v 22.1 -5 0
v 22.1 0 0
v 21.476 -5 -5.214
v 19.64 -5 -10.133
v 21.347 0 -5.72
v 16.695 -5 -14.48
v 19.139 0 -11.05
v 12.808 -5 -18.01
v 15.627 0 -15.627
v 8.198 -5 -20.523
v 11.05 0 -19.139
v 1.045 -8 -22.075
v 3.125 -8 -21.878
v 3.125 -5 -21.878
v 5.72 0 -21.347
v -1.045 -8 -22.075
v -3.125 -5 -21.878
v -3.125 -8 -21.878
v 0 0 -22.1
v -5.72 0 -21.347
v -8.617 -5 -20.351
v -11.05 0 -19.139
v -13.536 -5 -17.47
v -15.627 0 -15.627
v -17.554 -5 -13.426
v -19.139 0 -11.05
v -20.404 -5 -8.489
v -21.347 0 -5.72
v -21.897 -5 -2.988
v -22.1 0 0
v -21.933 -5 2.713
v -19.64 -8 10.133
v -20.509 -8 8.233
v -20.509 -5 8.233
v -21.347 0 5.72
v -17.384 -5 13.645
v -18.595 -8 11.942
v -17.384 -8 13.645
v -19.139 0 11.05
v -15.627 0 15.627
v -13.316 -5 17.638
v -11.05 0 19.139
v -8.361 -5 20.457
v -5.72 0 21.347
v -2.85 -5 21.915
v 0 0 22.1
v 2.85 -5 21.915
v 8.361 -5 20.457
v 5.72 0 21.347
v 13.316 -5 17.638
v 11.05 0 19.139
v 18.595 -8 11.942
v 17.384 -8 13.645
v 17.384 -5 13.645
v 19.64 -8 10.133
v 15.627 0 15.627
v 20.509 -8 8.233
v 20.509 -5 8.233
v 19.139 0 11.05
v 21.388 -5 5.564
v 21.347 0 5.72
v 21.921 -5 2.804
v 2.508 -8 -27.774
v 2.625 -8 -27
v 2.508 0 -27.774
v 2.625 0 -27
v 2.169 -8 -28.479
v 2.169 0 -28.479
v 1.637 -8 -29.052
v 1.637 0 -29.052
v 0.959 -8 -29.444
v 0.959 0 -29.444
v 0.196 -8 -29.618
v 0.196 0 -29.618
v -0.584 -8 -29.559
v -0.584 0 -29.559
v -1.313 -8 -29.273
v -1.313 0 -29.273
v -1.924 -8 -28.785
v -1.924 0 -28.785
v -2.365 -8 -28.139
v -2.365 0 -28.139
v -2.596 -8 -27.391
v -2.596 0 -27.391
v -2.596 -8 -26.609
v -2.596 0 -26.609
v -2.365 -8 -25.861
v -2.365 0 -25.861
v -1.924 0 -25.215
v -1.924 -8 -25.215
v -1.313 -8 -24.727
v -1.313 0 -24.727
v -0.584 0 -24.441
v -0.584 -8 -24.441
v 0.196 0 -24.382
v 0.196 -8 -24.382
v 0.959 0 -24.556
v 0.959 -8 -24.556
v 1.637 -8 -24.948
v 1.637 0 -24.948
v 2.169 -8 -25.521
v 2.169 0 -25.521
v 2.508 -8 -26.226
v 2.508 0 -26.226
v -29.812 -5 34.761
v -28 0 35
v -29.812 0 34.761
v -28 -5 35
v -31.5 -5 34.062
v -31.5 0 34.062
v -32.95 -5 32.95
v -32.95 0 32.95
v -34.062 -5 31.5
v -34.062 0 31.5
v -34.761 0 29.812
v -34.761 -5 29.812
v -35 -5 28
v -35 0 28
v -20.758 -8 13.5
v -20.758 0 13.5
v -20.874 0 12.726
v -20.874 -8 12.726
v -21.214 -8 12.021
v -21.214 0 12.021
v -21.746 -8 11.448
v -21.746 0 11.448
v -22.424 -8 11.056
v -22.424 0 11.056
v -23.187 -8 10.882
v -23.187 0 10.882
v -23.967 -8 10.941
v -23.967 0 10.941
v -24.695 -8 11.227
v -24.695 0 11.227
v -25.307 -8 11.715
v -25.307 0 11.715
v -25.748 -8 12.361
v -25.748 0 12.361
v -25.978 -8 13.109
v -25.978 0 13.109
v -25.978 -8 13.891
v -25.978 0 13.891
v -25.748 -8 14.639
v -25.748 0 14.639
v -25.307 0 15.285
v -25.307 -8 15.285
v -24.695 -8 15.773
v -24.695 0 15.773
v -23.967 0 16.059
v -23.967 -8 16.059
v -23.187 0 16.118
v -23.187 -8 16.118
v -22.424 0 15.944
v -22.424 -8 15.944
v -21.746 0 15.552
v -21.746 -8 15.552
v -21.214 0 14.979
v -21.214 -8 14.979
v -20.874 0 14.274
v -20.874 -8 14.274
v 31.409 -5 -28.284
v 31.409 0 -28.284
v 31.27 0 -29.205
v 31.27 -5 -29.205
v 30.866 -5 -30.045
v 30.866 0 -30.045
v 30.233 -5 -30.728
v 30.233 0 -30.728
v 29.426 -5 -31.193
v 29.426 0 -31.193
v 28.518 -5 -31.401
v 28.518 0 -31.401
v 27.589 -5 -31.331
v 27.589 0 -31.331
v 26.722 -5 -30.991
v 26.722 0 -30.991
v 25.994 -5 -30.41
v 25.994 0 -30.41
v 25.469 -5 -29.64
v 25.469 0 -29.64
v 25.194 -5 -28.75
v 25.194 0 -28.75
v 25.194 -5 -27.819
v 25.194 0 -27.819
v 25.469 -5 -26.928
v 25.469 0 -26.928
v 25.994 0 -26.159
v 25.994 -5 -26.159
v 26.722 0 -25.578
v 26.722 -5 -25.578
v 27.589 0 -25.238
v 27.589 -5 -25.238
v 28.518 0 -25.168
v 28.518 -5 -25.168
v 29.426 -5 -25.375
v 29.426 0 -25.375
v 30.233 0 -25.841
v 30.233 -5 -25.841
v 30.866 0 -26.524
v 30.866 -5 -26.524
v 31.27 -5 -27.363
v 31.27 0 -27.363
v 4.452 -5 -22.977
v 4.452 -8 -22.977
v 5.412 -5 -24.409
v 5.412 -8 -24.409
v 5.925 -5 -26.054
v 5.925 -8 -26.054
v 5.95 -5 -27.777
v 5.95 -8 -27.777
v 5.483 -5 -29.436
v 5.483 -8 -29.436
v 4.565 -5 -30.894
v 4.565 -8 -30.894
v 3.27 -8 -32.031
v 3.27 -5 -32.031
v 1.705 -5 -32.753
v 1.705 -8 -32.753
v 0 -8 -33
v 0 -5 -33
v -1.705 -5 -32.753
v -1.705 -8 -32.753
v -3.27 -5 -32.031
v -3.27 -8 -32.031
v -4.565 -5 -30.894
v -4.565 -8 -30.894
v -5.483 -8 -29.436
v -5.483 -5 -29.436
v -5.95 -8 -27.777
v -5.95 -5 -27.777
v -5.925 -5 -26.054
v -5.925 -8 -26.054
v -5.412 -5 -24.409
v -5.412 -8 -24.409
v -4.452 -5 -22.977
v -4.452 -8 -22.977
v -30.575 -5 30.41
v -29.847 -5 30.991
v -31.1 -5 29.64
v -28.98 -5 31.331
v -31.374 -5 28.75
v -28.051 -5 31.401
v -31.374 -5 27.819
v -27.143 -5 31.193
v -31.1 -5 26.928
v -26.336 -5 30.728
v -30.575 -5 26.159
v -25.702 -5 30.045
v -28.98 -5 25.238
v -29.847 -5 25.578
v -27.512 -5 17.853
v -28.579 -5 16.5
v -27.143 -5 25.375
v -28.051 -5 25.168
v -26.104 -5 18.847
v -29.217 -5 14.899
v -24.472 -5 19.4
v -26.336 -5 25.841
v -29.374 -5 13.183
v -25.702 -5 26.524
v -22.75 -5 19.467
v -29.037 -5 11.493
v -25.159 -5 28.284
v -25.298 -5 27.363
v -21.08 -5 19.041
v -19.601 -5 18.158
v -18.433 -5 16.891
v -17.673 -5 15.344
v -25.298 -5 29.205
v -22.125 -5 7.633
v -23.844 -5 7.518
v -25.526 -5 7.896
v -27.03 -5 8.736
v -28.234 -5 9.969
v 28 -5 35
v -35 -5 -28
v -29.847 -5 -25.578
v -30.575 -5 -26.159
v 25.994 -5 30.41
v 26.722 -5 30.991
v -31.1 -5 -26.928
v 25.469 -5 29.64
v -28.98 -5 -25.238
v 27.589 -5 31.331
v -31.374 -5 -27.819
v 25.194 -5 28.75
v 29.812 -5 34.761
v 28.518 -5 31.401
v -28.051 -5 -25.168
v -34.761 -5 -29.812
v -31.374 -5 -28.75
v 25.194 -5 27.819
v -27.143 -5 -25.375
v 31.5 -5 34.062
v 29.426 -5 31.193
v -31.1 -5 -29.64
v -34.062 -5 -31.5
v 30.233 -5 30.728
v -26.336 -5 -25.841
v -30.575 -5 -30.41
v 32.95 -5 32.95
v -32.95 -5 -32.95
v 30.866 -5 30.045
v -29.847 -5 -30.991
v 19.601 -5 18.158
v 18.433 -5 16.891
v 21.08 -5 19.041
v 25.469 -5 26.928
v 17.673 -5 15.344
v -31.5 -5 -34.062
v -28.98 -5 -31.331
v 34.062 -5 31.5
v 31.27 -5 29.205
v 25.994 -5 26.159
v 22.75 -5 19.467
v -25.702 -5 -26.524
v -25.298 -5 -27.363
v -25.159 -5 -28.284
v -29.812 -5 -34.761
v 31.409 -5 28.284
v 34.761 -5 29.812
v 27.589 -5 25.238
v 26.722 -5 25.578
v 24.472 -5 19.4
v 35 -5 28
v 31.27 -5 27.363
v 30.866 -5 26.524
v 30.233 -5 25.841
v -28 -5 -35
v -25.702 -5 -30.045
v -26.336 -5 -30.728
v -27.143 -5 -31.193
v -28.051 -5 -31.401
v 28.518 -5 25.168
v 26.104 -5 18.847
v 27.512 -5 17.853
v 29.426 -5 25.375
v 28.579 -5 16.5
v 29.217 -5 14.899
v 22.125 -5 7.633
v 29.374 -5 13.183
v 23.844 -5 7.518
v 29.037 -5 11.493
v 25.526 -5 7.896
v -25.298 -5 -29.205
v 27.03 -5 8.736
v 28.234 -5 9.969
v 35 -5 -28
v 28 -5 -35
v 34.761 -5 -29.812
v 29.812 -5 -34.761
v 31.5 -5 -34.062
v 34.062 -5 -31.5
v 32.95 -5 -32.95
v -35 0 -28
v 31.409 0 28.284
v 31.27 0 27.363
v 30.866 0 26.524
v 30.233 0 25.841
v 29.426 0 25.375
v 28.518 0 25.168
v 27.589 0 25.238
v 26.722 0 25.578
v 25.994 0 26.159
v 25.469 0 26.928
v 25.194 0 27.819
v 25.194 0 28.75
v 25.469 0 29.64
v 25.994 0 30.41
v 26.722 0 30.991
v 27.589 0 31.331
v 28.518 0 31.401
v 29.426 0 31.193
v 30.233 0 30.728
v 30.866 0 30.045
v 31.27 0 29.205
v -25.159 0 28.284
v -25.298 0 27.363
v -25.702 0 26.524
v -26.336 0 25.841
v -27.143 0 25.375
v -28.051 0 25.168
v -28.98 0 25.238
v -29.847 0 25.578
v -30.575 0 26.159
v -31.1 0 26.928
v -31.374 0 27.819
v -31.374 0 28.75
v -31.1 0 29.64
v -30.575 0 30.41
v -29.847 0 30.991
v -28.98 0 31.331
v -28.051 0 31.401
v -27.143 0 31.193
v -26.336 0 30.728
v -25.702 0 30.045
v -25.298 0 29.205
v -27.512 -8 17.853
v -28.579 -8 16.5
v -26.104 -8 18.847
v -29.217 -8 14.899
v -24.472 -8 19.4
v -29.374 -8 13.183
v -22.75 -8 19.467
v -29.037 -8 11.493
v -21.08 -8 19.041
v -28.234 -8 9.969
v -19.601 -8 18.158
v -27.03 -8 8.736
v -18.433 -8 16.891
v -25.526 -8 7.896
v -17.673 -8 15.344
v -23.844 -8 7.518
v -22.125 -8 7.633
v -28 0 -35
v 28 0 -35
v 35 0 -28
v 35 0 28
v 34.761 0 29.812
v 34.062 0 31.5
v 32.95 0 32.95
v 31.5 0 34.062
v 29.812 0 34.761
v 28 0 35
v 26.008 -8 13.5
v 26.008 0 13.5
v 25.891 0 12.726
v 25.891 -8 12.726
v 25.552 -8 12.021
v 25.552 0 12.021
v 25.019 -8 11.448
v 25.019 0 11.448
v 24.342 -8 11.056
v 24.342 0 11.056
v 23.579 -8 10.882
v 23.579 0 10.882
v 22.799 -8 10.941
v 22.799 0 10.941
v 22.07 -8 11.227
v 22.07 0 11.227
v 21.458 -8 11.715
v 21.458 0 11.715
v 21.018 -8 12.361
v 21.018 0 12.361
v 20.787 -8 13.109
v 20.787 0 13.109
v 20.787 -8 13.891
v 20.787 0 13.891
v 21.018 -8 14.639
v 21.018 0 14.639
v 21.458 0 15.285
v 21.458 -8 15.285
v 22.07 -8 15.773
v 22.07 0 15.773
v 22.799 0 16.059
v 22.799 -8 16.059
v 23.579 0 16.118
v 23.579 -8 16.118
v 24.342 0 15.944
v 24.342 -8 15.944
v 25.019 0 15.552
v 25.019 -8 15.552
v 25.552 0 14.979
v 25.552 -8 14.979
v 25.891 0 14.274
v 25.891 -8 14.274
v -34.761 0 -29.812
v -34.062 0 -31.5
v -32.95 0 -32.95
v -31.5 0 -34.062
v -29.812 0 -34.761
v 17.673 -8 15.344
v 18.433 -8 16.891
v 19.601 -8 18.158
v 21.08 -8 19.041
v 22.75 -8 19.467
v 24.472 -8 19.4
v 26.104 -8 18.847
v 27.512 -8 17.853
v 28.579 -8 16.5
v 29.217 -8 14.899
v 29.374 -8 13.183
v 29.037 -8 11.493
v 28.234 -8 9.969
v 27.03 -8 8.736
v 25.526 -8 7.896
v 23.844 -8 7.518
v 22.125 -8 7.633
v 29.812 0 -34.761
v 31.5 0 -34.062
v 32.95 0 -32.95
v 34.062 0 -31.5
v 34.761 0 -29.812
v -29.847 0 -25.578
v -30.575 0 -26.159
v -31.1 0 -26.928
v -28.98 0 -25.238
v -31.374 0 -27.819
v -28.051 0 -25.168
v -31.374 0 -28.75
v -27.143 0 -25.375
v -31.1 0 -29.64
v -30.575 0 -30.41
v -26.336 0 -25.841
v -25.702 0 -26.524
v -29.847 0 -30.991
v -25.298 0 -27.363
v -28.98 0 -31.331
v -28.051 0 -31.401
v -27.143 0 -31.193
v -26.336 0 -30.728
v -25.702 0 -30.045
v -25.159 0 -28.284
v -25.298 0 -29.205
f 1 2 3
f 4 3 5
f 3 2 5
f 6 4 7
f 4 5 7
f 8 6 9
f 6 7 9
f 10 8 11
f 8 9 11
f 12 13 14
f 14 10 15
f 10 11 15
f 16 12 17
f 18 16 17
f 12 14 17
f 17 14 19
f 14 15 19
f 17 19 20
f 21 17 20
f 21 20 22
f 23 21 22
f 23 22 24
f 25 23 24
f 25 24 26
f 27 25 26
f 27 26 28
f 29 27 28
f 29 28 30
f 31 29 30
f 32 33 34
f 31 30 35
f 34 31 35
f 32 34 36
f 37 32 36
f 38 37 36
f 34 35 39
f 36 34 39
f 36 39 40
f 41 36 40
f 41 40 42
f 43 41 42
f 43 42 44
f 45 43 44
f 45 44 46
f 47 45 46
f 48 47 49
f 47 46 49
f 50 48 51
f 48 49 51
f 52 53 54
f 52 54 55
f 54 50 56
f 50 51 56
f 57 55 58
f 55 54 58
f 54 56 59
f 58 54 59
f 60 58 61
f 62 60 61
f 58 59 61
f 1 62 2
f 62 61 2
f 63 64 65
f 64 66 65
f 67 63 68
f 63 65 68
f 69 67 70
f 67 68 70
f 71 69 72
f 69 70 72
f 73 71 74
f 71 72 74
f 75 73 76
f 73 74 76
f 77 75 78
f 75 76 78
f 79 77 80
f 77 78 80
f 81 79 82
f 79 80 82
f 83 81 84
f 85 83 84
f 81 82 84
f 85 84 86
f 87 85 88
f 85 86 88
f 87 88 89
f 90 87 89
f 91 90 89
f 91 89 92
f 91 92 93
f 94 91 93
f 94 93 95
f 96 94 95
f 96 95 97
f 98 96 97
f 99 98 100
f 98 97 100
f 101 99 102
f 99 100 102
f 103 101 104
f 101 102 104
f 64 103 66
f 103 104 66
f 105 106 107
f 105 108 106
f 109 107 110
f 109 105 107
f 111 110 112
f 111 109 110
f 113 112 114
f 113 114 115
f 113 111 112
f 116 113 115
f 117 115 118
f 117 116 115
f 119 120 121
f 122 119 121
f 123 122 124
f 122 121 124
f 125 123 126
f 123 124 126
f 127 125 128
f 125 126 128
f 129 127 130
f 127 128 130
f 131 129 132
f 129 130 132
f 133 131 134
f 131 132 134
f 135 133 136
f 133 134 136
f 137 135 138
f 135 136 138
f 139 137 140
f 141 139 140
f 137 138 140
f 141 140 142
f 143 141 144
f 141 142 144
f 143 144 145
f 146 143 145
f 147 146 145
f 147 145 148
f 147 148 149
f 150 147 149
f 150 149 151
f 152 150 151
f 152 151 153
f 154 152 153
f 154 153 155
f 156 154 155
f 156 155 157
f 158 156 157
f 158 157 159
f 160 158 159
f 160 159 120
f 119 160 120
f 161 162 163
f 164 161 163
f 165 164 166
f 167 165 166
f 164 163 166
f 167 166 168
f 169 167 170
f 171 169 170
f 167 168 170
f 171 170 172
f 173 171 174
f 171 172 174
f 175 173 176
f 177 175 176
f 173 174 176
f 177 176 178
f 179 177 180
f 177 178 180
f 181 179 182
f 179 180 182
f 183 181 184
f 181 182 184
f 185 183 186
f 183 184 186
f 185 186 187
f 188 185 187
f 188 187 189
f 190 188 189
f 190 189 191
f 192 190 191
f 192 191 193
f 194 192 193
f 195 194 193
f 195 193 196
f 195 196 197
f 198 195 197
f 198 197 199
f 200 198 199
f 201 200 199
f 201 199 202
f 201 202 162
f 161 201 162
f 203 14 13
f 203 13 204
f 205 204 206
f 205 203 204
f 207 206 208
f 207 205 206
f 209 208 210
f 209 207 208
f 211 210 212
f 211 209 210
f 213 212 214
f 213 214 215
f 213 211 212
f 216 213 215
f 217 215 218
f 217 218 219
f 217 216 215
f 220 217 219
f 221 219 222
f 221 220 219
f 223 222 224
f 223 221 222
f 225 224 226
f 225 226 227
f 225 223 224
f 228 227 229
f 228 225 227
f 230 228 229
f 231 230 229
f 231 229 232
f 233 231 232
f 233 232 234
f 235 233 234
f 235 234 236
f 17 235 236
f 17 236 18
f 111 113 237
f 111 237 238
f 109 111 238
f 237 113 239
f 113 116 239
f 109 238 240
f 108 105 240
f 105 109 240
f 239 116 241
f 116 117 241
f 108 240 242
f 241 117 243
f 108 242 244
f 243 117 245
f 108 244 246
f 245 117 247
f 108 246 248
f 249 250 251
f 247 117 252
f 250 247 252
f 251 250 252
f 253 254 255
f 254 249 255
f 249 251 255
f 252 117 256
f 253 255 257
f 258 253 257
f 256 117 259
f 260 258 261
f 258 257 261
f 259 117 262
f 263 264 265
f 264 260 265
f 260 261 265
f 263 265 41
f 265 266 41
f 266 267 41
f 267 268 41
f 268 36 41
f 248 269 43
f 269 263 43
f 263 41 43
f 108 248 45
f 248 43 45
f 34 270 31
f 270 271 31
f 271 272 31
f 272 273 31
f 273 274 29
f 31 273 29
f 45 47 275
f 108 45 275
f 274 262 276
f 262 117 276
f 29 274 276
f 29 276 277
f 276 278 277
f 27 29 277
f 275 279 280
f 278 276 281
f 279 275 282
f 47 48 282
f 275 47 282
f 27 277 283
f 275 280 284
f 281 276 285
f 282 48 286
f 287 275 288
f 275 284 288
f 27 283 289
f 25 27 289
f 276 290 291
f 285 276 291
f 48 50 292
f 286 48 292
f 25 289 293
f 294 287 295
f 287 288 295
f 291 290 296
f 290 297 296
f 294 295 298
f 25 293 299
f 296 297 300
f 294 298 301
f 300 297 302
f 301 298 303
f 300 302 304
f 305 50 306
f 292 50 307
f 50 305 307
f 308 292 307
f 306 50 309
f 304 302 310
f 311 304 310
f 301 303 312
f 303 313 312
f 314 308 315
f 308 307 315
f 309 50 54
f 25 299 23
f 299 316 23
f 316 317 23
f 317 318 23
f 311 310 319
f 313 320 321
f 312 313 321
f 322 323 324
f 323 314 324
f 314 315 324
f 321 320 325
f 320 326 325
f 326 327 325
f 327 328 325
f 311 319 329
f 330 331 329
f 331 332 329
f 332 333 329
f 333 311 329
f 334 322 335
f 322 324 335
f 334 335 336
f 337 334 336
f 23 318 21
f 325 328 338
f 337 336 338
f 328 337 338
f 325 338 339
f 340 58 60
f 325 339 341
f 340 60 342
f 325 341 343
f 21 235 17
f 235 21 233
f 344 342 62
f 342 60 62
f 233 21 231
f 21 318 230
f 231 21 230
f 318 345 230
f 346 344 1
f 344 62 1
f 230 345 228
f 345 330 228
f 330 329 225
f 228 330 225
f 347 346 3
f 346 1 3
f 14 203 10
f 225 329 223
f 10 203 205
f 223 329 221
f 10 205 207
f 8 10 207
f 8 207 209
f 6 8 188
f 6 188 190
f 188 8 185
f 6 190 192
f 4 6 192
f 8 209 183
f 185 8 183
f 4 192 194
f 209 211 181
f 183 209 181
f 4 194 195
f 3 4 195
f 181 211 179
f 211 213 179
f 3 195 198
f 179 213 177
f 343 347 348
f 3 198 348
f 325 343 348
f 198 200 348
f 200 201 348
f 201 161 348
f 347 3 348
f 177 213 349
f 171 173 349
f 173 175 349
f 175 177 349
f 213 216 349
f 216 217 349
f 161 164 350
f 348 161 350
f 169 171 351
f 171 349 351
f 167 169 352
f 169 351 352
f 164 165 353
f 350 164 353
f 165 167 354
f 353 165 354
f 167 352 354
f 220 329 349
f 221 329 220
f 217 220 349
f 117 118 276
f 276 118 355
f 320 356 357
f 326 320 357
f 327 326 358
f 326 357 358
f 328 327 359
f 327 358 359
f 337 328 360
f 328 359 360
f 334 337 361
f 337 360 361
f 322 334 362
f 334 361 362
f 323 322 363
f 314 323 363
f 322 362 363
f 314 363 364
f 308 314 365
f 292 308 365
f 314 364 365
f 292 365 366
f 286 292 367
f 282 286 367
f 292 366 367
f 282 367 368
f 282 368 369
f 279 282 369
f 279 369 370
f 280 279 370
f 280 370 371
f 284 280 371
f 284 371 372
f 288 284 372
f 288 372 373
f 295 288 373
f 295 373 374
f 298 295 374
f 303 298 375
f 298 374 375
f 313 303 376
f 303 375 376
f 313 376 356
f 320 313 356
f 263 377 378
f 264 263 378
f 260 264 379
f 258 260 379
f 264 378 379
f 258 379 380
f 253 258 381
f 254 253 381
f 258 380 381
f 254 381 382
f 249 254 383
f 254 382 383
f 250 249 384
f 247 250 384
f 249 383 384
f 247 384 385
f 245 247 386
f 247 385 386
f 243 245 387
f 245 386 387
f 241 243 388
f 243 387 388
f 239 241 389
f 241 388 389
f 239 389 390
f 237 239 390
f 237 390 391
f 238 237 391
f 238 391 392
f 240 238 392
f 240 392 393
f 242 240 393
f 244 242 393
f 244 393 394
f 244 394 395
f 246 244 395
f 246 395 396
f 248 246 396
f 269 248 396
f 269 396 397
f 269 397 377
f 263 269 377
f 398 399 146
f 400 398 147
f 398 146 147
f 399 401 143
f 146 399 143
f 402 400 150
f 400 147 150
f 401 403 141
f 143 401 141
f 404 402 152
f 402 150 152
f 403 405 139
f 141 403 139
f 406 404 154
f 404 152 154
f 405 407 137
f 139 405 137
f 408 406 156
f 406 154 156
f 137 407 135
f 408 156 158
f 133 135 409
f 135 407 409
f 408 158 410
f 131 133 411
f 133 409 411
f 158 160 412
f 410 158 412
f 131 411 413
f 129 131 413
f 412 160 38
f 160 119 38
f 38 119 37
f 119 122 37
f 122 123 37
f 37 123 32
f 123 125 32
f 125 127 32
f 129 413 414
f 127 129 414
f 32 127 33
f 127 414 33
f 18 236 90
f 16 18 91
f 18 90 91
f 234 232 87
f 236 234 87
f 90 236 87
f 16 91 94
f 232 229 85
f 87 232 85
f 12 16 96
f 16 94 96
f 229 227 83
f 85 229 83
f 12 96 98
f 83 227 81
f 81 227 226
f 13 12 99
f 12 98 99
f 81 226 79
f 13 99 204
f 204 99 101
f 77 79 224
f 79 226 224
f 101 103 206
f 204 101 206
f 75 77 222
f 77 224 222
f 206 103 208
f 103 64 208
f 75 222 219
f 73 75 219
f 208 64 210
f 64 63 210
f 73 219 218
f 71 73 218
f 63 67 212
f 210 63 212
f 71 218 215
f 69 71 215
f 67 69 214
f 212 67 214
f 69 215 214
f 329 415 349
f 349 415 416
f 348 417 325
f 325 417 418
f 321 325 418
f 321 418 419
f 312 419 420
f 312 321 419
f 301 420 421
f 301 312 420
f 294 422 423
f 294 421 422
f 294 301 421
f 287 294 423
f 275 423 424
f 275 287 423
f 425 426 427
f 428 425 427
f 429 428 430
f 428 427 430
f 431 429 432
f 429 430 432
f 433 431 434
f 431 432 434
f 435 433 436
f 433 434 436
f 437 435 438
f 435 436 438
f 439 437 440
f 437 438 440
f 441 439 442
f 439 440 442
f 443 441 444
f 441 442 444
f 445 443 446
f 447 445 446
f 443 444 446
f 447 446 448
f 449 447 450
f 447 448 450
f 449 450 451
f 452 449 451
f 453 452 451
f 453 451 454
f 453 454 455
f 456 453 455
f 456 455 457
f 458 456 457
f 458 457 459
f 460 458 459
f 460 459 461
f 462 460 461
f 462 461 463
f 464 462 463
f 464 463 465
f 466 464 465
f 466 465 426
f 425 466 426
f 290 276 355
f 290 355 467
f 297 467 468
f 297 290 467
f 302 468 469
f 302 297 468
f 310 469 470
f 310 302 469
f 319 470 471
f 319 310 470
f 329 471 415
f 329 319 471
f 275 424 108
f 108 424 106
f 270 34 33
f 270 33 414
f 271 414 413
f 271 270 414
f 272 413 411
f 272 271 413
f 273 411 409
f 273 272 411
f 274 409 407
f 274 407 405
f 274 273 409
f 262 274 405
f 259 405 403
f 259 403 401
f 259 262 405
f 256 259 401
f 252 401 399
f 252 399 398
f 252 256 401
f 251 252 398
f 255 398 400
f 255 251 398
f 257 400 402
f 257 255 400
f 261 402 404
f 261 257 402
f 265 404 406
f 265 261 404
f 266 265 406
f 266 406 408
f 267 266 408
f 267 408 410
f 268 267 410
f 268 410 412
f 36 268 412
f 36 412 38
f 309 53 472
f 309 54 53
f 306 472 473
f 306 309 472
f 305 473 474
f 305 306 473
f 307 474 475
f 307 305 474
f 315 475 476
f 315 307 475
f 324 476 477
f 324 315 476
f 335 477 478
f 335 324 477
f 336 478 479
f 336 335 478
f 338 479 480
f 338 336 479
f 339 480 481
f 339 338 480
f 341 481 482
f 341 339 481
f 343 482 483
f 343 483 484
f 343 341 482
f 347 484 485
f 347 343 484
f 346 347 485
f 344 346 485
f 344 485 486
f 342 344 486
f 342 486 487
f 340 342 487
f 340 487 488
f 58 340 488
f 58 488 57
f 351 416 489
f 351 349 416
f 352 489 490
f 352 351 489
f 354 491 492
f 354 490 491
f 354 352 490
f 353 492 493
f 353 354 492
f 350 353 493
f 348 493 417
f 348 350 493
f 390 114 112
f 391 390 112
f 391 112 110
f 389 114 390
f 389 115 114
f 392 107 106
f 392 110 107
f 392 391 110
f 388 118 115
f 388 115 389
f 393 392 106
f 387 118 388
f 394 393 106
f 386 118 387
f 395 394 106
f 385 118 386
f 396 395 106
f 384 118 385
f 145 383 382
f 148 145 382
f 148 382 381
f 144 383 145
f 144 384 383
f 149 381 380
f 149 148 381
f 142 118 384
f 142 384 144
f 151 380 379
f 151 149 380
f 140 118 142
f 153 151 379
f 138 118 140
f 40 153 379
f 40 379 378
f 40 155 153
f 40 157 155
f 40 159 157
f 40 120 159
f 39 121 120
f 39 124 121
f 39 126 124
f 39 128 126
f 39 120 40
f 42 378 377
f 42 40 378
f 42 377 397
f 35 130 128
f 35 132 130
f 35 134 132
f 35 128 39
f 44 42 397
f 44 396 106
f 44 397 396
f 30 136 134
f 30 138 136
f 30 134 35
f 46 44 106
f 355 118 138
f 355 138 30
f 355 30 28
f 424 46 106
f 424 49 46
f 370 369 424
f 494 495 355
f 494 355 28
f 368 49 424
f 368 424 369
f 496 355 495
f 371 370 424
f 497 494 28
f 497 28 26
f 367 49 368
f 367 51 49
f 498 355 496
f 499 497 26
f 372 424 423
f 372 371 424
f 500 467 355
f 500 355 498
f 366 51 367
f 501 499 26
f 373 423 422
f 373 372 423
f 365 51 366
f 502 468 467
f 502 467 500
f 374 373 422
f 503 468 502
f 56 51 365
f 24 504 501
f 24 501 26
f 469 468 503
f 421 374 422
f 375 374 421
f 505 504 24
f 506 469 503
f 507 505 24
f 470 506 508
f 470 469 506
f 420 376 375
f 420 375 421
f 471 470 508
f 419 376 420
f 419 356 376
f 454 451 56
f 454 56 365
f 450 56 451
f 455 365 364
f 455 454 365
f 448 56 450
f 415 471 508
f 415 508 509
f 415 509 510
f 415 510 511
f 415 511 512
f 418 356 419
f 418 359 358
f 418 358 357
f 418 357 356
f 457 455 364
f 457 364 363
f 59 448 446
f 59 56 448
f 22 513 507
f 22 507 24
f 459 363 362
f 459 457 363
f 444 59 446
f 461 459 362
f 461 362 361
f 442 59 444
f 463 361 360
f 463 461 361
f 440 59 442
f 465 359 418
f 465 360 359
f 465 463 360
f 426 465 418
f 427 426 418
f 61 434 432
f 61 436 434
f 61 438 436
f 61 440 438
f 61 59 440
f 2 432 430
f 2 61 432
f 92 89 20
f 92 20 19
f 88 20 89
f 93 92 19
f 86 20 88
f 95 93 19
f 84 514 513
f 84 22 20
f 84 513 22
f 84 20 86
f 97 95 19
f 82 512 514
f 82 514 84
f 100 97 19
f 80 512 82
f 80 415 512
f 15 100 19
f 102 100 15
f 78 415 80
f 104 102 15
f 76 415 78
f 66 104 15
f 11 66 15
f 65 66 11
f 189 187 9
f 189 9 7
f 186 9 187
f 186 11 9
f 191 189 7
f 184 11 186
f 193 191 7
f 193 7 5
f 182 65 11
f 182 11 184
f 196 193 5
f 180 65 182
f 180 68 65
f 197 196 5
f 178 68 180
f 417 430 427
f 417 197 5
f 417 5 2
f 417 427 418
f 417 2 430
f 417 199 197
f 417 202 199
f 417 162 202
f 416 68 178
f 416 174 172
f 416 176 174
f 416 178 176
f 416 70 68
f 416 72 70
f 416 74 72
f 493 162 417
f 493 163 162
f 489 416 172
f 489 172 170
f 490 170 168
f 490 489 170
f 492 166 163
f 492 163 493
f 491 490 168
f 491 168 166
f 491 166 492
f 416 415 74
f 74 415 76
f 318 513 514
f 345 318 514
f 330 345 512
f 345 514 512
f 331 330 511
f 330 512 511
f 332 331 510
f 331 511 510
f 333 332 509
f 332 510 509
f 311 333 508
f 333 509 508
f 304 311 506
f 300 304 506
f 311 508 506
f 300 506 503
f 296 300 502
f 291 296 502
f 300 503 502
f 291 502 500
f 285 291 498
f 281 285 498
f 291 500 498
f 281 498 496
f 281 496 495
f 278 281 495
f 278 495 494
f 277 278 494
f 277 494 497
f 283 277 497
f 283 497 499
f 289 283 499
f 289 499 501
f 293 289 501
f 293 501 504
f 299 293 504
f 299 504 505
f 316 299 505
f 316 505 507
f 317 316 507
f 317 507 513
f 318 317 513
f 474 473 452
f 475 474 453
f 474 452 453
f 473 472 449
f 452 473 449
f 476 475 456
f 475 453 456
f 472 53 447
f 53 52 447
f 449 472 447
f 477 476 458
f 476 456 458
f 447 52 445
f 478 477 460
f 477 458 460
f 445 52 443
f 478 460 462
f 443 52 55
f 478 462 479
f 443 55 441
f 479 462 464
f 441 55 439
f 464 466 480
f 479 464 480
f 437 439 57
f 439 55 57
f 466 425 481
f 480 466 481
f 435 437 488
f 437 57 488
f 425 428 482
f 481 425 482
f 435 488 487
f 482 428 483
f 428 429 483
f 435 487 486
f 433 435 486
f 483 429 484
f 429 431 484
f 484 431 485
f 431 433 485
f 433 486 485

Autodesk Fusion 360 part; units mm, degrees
sketch "Sketch1" plane through (0, 0, 0) normal (0, 1, 0) x (1, 0, 0)
  line L0 (35, -35) -> (-35, -35)
  line L1 (-35, -35) -> (-35, 35)
  line L2 (-35, 35) -> (35, 35)
  line L3 (35, 35) -> (35, -35)
  line L4 (35, -35) -> (-35, 35) construction
  line L5 (-35, -35) -> (35, 35) construction
  dimension "d1" = 70
  dimension "d2" = 70
sketch "Sketch2" plane through (0, 0, 0) normal (0, 1, 0) x (1, 0, 0)
  line L0 (35, -35) -> (-35, 35)
  line L1 (28.2843, -28.2843) -> (-28.2843, -28.2843) construction
  line L2 (-28.2843, -28.2843) -> (-28.2843, 28.2843) construction
  line L3 (-28.2843, 28.2843) -> (28.2843, 28.2843) construction
  line L4 (28.2843, 28.2843) -> (28.2843, -28.2843) construction
  line L5 (28.2843, -28.2843) -> (-28.2843, 28.2843) construction
  line L6 (-28.2843, -28.2843) -> (28.2843, 28.2843) construction
  circle A0 centre (-28.2843, 28.2843) radius 3.125
  circle A1 centre (28.2843, 28.2843) radius 3.125
  circle A2 centre (-28.2843, -28.2843) radius 3.125
  circle A3 centre (28.2843, -28.2843) radius 3.125
  dimension "d6" = 80
  dimension "d7" = 6.25
  dimension "d12" = 6.25
  dimension "d13" = 6.25
  dimension "d14" = 6.25
sketch "Sketch3" plane through (0, 0, 0) normal (0, 1, 0) x (1, 0, 0)
  circle A0 centre (0, 0) radius 22.1
  dimension "d15" = 44.2
sketch "Sketch4" plane through (0, 0, 0) normal (0, 1, 0) x (1, 0, 0)
  circle A0 centre (0, 0) radius 27 construction
  circle A1 centre (0, 27) radius 2.625
  circle A2 centre (0, 27) radius 6
  circle A3 centre (-23.3827, -13.5) radius 2.625
  circle A4 centre (-23.3827, -13.5) radius 6
  circle A5 centre (23.3827, -13.5) radius 2.625
  circle A6 centre (23.3827, -13.5) radius 6
  dimension "d16" = 54
  dimension "d17" = 5.25
  dimension "d20" = 12
  dimension "d22" = 360
extrude "Extrude1" add sketch "Sketch1" against normal blind 5 makes body 1
extrude "Extrude4" add sketch "Sketch4" against normal blind 8 bodies 1
extrude "Extrude5" cut sketch "Sketch4" against normal up to surface (8 mm away) contours A1 | A3 | A5 bodies 1
fillet "Fillet1" radius 7 4 edges at (35, -2.5, 35) (35, -2.5, -35) (-35, -2.5, -35) (-35, -2.5, 35) on bodies 1
copy_body "Body->Comp1" bodies 1 removing the originals makes body 2 in component "Component"
extrude "Extrude1'" cut sketch "Sketch3" sketch "Sketch2" along normal up to surface of sketch 2 end surface through (0, -8, 0) normal (0, -1, 0) offset 0 bodies 2 in component "Component"
component "Component" placed x (1, 0, 0) y (0, 1, 0) z (0, 0, 1) at (0, 0, 0)
